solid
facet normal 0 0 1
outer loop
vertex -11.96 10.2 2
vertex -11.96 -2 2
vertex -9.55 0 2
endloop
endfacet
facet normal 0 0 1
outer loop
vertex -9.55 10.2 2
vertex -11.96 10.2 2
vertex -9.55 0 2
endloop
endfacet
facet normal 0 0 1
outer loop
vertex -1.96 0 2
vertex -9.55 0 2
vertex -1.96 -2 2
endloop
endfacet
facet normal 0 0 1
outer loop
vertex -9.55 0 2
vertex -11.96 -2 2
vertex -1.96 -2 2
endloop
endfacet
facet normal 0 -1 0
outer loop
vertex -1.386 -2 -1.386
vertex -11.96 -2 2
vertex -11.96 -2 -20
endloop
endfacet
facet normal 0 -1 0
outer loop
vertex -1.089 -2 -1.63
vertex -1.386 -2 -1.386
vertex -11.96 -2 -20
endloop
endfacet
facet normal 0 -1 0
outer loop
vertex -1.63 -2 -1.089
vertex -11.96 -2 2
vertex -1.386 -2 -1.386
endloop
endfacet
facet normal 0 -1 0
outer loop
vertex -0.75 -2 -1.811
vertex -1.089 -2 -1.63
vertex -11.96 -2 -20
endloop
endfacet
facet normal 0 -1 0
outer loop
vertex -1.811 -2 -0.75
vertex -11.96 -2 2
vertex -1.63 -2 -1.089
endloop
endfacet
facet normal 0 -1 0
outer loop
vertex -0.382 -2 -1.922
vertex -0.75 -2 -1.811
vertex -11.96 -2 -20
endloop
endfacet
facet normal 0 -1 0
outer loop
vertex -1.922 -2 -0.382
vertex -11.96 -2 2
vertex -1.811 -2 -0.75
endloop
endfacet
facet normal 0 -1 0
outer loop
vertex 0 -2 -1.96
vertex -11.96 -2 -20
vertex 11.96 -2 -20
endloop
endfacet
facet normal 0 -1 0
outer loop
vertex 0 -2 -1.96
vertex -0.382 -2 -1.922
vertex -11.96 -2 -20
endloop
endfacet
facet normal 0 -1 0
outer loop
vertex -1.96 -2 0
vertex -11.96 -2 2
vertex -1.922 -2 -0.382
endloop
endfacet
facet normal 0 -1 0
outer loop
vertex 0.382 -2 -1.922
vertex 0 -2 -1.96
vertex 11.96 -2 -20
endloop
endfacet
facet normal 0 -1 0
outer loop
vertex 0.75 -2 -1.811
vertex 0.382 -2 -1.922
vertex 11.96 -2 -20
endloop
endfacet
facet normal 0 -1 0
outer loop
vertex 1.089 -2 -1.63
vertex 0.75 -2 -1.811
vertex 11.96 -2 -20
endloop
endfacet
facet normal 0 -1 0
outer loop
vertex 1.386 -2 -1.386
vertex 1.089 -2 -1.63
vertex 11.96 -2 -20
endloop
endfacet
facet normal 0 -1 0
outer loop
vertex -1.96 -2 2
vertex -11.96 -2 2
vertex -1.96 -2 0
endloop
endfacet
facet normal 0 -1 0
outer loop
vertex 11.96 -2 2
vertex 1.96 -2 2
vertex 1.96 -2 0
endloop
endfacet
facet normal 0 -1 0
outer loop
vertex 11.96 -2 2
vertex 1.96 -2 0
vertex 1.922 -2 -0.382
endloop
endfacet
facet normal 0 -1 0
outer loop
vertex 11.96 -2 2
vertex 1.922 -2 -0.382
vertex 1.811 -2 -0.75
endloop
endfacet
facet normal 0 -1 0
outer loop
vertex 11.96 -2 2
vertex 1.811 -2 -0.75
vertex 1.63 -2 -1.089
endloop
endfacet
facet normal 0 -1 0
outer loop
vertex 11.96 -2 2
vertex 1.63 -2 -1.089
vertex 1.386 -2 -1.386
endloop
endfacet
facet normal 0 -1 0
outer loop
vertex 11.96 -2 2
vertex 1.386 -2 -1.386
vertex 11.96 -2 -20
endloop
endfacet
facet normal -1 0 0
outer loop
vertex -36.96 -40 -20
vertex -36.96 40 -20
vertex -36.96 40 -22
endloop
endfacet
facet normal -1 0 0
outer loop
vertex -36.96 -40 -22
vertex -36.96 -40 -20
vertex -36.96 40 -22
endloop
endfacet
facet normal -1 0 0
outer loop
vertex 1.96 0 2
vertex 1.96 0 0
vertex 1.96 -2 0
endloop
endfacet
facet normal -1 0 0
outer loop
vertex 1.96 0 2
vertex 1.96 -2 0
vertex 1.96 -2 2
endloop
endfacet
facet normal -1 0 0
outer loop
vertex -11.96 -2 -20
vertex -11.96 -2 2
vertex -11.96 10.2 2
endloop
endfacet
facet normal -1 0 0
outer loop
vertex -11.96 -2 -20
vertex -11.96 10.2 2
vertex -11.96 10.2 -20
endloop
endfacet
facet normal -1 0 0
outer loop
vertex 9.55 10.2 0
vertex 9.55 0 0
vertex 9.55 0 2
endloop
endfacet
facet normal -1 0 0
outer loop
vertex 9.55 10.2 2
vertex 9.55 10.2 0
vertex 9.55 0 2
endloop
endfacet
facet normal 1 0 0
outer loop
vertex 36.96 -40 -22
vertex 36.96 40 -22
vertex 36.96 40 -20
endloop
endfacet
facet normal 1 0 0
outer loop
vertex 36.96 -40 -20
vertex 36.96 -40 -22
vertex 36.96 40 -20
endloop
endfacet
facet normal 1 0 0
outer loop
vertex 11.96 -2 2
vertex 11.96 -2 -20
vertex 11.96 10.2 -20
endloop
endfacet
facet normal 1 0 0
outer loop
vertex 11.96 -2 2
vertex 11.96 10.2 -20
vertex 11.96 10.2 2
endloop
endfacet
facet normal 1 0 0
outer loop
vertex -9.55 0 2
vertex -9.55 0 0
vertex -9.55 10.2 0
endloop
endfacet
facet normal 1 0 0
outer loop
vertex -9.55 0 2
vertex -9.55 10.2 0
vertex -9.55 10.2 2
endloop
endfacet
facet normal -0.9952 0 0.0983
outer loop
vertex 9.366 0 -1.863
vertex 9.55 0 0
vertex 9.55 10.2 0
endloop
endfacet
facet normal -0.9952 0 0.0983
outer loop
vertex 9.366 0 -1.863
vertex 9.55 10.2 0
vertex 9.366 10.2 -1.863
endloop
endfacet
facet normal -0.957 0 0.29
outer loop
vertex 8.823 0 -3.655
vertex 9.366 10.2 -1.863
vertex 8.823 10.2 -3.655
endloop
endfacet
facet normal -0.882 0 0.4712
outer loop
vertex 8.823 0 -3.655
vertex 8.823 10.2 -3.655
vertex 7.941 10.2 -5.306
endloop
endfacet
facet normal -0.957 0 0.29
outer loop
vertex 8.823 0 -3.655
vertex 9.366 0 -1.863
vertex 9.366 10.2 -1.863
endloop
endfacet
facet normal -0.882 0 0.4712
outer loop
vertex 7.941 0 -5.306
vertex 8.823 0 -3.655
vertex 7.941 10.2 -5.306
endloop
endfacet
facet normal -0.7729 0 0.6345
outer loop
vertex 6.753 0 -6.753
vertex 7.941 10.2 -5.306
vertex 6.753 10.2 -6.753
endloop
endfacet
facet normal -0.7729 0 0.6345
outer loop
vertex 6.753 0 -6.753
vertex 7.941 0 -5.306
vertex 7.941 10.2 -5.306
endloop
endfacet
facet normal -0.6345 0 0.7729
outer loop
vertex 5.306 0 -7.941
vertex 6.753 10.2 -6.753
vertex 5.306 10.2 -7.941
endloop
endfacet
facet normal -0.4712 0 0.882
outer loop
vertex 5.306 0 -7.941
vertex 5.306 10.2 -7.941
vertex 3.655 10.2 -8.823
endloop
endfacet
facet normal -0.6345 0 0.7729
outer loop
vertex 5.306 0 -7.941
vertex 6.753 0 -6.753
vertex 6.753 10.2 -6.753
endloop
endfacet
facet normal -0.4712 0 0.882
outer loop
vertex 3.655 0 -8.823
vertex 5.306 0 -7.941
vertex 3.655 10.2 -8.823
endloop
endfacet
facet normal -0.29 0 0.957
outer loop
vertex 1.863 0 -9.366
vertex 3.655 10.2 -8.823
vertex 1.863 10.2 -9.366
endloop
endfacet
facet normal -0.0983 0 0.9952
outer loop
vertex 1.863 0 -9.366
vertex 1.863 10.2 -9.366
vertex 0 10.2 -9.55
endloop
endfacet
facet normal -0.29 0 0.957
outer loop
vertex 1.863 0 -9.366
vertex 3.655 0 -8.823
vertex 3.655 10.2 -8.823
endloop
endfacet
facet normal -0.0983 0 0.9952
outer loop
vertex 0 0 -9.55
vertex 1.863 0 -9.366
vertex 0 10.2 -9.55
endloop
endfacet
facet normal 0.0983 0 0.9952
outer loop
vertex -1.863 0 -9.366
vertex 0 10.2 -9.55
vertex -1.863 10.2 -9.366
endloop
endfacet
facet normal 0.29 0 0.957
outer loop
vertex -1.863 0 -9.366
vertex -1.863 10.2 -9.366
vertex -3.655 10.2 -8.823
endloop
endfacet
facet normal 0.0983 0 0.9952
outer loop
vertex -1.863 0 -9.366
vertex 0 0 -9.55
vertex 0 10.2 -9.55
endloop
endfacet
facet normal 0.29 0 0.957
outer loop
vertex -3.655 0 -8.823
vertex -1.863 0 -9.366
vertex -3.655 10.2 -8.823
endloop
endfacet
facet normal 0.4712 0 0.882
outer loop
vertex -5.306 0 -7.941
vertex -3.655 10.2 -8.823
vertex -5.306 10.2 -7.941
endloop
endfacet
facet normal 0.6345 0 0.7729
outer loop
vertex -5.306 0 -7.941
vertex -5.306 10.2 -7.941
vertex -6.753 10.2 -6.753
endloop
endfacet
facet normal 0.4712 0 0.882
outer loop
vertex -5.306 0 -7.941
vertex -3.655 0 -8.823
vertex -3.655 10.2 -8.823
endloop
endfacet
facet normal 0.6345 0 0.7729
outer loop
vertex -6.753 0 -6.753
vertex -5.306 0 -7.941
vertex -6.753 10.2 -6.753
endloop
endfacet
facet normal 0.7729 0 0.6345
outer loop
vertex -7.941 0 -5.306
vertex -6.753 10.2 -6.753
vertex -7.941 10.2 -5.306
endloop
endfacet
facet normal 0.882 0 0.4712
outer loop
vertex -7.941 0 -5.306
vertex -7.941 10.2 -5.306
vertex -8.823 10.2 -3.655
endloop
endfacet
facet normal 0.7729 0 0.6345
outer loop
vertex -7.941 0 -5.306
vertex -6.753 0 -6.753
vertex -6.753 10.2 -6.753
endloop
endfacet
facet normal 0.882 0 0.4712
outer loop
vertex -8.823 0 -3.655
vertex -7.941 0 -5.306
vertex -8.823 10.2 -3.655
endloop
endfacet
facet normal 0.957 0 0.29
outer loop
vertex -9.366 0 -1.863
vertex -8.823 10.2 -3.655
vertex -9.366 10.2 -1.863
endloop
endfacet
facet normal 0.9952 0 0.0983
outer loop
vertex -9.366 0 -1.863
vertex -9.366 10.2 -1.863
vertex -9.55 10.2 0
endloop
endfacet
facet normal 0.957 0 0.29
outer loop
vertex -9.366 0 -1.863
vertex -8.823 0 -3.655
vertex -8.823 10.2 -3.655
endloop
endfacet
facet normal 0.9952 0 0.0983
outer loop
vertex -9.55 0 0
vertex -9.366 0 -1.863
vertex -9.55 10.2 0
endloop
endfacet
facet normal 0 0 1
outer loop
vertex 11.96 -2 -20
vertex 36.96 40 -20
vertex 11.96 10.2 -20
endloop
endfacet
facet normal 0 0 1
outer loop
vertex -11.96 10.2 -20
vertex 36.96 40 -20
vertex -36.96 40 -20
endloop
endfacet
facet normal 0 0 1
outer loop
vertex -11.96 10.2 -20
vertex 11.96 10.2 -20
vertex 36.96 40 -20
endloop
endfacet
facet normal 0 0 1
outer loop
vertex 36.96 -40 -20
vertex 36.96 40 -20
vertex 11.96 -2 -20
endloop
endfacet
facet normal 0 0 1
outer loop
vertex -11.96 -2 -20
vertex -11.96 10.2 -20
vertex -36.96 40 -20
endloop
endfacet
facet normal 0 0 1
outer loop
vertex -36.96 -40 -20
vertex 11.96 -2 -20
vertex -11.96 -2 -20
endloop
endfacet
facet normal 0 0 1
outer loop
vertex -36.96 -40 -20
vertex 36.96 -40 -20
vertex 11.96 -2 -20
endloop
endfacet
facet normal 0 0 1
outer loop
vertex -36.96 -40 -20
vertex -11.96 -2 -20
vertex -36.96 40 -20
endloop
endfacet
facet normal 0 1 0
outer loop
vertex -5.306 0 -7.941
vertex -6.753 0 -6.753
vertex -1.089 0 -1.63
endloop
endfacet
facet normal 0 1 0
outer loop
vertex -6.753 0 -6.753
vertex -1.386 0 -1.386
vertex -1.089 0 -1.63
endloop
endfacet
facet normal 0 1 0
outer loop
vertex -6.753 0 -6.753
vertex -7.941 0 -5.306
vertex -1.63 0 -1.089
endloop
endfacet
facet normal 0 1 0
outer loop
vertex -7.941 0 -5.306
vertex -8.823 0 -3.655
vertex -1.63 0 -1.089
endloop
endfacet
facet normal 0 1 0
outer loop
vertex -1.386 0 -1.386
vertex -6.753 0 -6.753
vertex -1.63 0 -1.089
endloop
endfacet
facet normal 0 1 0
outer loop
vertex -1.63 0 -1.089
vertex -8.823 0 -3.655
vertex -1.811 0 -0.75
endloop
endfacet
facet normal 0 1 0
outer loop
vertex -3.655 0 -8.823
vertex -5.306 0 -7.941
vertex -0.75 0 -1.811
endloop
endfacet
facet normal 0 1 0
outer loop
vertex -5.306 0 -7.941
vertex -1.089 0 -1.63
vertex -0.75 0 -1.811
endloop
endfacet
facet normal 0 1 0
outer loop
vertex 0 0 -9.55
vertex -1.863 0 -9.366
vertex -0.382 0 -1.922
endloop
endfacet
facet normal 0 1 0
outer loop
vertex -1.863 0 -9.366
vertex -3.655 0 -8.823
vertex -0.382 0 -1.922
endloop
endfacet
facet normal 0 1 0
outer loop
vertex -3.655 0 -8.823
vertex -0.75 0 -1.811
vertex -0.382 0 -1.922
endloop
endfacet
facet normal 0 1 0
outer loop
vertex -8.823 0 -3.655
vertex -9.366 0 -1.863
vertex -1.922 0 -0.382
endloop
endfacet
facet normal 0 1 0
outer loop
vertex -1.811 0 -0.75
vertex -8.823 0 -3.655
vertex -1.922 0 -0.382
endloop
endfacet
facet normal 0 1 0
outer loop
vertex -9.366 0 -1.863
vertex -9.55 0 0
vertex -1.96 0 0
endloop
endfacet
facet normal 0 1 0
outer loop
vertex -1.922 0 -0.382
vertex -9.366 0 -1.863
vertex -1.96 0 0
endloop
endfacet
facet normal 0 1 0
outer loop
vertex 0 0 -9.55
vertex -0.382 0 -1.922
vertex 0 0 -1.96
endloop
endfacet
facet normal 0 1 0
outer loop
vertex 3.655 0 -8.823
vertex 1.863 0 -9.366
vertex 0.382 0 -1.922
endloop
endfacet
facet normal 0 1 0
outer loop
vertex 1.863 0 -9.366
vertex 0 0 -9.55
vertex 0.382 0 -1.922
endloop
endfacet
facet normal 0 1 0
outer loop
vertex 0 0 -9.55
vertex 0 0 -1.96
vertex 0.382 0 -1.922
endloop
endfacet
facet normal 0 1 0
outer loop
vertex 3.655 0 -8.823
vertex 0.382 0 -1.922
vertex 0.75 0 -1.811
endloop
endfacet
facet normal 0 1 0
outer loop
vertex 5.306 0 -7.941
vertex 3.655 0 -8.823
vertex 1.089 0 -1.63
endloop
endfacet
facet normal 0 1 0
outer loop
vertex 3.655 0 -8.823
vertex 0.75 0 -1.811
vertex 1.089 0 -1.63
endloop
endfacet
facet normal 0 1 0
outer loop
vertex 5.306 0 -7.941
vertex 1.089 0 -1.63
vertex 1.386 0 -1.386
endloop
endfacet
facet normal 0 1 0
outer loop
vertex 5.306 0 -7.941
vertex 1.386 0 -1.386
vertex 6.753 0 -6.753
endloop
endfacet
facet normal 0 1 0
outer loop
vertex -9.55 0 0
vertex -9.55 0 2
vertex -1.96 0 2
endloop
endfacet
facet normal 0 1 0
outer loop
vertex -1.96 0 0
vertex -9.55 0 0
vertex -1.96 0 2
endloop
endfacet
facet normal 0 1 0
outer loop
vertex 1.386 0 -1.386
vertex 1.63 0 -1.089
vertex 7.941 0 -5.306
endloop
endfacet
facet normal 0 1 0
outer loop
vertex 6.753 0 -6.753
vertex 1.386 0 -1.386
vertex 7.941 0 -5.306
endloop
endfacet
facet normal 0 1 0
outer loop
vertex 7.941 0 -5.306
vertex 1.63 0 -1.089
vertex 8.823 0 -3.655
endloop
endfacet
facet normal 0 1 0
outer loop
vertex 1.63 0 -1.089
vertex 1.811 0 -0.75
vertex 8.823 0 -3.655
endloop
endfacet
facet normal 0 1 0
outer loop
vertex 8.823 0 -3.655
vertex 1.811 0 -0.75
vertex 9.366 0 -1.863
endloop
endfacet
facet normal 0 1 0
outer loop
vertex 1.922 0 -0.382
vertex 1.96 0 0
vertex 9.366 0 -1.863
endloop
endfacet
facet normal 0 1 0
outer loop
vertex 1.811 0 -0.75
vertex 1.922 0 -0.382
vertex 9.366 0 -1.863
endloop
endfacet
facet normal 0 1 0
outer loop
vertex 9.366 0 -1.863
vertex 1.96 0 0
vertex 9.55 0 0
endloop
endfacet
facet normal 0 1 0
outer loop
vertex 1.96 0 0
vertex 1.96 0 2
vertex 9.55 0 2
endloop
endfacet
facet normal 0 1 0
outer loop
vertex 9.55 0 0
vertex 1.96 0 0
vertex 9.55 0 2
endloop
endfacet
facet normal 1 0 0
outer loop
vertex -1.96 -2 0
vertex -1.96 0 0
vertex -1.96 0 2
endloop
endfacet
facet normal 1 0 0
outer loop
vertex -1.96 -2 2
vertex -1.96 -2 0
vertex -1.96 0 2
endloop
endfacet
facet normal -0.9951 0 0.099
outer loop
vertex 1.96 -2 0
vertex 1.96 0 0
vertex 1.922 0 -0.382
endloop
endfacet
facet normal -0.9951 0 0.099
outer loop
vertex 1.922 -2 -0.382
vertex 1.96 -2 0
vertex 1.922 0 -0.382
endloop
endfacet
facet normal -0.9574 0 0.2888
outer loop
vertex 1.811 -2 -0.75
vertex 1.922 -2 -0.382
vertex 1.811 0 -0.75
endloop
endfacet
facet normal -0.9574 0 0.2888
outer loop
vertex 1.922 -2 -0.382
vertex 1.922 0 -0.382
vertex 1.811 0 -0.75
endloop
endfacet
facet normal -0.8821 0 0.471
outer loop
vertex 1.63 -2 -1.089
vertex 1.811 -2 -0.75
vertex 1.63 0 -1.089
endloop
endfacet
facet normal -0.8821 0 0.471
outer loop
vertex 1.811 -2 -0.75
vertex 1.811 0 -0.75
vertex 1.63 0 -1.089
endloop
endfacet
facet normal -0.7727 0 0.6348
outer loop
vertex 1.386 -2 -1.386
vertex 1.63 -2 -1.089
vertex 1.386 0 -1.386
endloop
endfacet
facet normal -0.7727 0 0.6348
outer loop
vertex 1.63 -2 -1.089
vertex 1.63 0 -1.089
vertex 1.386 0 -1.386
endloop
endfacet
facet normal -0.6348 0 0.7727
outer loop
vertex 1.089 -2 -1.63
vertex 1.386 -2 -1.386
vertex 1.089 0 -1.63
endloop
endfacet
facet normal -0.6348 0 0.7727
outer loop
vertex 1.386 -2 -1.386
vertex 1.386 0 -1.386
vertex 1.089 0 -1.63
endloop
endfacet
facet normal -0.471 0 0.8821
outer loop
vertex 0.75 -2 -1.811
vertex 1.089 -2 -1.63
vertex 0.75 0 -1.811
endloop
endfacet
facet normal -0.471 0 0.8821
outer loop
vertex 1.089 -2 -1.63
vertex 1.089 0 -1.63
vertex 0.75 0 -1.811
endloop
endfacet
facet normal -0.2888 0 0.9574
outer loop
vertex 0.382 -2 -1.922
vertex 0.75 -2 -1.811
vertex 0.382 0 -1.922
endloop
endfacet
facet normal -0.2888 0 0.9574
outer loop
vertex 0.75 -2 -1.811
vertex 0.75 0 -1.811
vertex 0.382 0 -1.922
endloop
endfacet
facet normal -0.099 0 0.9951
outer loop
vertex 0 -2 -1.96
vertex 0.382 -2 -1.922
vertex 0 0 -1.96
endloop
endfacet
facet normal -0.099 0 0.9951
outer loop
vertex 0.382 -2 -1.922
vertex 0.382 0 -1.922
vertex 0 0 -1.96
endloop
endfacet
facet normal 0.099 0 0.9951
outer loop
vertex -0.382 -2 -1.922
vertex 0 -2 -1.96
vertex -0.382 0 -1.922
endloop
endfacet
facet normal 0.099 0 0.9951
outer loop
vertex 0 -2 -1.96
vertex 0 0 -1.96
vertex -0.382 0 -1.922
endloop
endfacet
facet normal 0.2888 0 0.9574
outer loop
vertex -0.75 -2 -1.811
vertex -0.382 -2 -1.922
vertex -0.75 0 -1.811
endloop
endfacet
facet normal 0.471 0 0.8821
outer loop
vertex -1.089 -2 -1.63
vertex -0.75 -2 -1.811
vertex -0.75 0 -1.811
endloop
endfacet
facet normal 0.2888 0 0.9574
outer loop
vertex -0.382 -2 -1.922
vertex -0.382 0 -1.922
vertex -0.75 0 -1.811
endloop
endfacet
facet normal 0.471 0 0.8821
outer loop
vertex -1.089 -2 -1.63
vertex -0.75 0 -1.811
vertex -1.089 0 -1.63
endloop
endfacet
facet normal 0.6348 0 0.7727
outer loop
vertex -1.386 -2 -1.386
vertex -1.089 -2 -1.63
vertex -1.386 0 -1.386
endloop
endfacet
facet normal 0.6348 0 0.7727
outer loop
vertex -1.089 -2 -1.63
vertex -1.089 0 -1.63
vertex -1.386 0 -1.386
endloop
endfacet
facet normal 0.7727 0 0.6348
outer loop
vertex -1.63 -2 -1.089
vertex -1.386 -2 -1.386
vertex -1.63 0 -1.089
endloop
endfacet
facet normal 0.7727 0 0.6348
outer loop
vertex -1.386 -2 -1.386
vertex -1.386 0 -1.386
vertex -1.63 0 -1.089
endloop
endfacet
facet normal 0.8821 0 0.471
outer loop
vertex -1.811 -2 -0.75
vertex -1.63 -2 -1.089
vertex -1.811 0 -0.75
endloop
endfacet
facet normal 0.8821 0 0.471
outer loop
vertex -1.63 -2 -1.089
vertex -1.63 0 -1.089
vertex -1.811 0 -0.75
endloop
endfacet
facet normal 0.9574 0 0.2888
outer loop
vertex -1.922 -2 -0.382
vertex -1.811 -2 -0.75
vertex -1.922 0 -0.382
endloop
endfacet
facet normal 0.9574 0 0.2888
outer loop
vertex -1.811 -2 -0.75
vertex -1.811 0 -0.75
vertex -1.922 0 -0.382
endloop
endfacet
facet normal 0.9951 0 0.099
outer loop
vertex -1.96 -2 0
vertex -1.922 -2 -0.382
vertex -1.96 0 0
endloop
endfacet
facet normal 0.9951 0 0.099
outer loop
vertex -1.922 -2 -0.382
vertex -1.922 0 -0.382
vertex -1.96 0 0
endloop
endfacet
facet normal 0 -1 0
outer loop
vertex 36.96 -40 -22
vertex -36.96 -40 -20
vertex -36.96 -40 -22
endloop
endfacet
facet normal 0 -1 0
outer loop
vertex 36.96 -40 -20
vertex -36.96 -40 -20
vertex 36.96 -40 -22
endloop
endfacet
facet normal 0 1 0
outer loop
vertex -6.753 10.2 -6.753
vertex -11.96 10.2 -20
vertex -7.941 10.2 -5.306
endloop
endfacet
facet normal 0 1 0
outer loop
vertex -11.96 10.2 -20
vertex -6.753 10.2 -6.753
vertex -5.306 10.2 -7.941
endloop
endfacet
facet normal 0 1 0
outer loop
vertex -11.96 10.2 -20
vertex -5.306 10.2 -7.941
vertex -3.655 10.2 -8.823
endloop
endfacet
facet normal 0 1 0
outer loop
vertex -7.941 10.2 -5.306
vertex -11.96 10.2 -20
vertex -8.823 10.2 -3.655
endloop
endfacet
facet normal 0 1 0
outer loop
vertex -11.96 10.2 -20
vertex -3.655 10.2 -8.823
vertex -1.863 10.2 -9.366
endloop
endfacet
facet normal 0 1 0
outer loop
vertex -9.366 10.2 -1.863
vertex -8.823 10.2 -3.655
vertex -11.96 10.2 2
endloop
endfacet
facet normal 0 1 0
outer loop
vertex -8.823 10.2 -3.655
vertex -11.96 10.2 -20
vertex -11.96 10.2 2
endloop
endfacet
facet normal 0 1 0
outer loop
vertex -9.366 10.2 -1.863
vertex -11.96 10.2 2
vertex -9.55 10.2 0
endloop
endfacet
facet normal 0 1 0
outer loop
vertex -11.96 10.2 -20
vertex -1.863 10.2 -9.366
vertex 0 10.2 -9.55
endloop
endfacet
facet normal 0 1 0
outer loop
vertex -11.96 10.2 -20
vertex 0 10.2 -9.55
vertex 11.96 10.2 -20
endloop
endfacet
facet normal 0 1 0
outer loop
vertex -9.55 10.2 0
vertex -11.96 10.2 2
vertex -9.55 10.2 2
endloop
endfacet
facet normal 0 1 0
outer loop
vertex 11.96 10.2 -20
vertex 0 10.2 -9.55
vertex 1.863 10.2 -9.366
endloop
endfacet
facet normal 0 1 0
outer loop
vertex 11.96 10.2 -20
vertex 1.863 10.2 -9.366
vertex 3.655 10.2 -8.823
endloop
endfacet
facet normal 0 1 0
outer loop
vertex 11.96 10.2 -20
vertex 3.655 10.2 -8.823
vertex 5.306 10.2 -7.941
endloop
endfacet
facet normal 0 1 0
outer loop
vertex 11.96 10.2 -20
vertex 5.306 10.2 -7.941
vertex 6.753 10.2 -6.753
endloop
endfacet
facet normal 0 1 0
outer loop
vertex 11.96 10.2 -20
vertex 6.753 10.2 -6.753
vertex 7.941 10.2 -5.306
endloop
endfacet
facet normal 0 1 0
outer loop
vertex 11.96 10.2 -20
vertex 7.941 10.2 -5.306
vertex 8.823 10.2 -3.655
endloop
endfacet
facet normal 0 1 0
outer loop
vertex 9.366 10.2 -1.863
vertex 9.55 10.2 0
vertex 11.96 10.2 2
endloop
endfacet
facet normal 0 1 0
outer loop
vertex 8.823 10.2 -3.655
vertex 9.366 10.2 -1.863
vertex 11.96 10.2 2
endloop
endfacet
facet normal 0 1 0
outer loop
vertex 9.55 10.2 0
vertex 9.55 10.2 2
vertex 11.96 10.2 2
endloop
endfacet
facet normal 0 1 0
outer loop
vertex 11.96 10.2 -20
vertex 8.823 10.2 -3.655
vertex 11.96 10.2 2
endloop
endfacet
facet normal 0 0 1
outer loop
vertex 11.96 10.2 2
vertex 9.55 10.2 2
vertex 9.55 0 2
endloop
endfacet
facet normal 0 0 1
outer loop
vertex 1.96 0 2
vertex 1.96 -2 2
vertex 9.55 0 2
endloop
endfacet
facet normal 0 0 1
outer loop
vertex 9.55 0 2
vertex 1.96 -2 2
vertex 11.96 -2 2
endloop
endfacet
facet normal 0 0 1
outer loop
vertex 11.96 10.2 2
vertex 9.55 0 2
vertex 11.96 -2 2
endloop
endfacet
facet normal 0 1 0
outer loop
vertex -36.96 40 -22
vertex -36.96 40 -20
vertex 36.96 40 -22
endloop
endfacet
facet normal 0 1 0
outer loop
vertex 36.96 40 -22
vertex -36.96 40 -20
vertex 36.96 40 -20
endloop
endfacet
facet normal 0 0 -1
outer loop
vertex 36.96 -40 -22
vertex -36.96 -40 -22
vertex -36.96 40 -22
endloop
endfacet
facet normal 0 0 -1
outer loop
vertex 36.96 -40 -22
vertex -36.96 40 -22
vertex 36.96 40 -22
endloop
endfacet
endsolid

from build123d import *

# Parameters (mm, degrees)
F0_W     = 10
F0_H     = 2
F1_DEPTH = 2
F2_W     = 2.41
F2_H     = 2
F3_DEPTH = 10.2
F4_DEPTH = 40


with BuildPart() as f1:
    # F0 (on Front) → F1 (new body)
    with BuildSketch(Plane.XZ):
        with Locations((6.96, 1)):
            Rectangle(F0_W, F0_H)
        with Locations((-6.96, 1)):
            Rectangle(F0_W, F0_H)
        with BuildLine():
            ThreePointArc((1.96, 0), (0, -1.96), (-1.96, 0))
            Line((-1.96, 0), (-11.96, 0))
            Line((-11.96, 0), (-11.96, -20))
            Line((-11.96, -20), (11.96, -20))
            Line((11.96, -20), (11.96, 0))
            Line((11.96, 0), (1.96, 0))
        make_face()
    extrude(amount=F1_DEPTH)

    # F2 (on Front) → F3 (join)
    with BuildSketch(Plane.XZ):
        with BuildLine():
            ThreePointArc((9.55, 0), (0, -9.55), (-9.55, 0))
            Line((-9.55, 0), (-11.96, 0))
            Line((-11.96, 0), (-11.96, -20))
            Line((-11.96, -20), (11.96, -20))
            Line((11.96, -20), (11.96, 0))
            Line((11.96, 0), (9.55, 0))
        make_face()
        with Locations((-10.755, 1)):
            Rectangle(F2_W, F2_H)
        with Locations((10.755, 1)):
            Rectangle(F2_W, F2_H)
    extrude(amount=-F3_DEPTH)

    # F0 (on Front) → F4 (join, symmetric)
    with BuildSketch(Plane.XZ):
        Polygon((11.96, -20), (-11.96, -20), (-36.96, -20), (-36.96, -22), (36.96, -22), (36.96, -20), align=None)
    extrude(amount=F4_DEPTH, both=True)


solid = f1.part
